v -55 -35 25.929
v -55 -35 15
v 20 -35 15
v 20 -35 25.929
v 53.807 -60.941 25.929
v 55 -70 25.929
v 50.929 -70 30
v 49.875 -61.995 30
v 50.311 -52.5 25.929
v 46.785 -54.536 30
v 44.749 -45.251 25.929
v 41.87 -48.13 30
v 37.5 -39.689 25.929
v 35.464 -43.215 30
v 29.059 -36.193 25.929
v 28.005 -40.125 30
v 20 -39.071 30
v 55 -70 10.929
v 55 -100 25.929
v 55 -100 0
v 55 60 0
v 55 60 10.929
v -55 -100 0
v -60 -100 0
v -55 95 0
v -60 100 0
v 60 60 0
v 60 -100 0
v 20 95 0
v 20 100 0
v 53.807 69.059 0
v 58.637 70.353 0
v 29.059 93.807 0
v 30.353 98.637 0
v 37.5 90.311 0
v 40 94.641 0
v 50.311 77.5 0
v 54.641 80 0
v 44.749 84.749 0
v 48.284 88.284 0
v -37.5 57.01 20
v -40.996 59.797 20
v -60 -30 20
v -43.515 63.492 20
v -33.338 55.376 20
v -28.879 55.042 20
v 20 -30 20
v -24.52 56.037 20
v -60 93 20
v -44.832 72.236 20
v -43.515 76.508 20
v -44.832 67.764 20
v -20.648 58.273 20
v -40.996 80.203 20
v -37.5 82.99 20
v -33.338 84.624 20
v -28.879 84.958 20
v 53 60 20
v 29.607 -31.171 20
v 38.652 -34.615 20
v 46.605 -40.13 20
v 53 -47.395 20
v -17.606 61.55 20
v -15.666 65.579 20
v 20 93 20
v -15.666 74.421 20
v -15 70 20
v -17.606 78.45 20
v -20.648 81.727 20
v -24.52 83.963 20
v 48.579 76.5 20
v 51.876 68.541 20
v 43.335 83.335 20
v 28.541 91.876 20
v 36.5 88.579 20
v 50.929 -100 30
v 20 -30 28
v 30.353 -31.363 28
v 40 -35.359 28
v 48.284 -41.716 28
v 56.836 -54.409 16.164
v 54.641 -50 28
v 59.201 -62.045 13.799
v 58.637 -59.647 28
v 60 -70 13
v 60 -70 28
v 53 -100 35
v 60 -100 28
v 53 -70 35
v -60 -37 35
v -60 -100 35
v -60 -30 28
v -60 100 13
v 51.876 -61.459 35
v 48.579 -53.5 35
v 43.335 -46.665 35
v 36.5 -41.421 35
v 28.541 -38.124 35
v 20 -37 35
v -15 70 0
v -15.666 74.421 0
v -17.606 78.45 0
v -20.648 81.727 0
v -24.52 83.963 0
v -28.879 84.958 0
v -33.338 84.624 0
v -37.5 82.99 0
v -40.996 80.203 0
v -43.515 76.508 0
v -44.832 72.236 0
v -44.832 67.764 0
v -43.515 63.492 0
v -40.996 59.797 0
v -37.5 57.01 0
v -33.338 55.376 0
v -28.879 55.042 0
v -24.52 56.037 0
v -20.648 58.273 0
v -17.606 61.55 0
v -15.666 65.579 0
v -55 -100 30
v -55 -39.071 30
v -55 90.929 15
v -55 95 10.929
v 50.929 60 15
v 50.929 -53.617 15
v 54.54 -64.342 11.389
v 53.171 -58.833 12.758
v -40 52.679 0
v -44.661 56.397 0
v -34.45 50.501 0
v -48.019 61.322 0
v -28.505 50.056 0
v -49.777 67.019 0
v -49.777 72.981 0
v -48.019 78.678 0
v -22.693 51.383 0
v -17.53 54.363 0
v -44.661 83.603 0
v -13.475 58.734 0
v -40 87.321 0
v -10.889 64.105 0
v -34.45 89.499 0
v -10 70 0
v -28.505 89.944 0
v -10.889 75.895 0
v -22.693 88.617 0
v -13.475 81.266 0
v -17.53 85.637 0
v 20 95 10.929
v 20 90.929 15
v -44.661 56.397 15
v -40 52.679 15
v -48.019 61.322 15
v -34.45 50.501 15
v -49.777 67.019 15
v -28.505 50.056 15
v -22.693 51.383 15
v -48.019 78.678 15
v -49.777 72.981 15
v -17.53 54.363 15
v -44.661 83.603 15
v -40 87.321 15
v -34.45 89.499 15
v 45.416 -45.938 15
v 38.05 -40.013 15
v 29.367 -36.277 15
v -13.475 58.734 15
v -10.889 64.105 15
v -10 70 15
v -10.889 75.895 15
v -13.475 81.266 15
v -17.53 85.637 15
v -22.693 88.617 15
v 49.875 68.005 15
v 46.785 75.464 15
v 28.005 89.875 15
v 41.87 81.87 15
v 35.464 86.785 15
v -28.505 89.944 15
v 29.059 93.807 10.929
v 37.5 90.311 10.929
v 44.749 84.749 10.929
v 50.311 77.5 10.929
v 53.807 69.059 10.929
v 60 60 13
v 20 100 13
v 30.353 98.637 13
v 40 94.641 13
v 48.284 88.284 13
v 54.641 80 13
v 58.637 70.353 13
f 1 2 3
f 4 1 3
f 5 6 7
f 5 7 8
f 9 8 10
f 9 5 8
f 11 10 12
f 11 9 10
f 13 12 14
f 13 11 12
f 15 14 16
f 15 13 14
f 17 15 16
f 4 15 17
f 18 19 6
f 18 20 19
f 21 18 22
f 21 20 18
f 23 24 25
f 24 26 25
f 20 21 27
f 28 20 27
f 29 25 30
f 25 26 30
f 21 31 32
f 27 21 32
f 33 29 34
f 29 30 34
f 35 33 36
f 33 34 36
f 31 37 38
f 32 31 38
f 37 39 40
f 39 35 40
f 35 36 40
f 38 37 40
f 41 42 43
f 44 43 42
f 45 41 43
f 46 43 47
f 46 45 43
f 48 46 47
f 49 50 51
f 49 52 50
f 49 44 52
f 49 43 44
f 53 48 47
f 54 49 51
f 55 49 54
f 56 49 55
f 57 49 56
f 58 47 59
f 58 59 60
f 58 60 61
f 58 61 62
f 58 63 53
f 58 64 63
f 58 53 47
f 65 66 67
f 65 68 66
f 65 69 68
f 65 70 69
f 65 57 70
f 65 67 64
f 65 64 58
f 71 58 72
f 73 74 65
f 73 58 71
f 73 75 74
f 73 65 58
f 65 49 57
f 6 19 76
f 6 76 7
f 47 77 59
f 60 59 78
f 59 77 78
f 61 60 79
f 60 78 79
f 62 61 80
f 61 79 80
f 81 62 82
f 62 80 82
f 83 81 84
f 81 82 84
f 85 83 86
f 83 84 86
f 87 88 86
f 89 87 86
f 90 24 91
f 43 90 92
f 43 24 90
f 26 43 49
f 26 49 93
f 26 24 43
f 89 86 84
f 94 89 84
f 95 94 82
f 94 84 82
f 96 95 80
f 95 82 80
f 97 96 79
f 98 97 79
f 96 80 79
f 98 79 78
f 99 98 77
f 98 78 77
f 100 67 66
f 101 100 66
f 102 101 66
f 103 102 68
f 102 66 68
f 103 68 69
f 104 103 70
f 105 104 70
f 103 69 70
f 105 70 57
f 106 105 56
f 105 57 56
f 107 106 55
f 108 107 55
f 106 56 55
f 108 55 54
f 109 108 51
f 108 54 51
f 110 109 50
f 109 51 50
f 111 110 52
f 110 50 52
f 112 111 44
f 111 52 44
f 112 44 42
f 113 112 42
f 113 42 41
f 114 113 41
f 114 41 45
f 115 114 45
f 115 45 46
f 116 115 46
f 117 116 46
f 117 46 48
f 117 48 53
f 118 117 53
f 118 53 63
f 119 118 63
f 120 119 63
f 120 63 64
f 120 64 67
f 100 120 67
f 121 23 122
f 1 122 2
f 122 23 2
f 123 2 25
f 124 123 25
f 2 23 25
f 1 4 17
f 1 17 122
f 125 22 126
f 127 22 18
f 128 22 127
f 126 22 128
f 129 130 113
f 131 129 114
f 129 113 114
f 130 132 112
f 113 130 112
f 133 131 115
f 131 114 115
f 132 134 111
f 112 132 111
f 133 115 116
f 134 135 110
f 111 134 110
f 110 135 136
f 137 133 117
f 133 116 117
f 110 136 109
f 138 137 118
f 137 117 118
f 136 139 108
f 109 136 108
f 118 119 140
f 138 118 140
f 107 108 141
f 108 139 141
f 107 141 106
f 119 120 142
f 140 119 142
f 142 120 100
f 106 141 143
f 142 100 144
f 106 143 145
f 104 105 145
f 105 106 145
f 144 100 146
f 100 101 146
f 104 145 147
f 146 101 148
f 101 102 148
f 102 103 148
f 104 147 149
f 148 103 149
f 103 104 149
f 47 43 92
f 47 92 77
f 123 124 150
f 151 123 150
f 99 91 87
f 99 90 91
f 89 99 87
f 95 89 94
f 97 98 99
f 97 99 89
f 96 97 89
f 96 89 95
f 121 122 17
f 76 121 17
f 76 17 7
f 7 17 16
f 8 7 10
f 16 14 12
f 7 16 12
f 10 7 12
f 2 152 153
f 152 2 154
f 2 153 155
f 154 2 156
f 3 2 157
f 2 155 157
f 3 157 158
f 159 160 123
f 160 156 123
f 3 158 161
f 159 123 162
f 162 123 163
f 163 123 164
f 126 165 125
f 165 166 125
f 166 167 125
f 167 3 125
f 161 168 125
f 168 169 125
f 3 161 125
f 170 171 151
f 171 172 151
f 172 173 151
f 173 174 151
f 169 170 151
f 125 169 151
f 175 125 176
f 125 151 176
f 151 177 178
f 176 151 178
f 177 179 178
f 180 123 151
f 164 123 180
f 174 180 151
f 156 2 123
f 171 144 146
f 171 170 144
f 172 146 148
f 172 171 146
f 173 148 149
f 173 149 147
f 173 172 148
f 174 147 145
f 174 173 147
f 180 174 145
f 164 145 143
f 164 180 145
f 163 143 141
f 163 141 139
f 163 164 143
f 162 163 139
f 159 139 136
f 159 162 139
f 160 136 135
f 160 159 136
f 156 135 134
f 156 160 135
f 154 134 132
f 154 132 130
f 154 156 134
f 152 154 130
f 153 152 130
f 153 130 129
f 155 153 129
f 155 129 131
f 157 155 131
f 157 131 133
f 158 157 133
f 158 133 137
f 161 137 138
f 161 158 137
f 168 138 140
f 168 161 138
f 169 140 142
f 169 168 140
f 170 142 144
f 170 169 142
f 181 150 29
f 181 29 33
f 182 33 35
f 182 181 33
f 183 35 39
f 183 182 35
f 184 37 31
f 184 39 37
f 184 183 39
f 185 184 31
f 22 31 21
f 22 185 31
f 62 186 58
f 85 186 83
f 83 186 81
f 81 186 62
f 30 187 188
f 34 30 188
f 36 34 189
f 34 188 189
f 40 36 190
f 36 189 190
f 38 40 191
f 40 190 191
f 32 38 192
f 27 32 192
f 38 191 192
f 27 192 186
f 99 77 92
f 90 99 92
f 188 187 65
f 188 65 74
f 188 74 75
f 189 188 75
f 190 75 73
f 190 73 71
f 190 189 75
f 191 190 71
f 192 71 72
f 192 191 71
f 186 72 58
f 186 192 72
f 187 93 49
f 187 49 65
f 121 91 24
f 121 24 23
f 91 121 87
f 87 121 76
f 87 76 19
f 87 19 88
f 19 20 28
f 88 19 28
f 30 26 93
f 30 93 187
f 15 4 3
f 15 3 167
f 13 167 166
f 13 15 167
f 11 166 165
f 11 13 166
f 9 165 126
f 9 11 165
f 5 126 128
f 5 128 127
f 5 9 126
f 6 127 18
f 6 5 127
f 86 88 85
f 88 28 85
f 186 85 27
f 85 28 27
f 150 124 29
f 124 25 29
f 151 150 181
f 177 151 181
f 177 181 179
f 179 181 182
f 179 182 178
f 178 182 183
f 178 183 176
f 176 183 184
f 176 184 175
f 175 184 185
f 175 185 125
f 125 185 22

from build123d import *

# Parameters (mm, degrees)
SKETCH1_W           = 120
SKETCH1_H           = 200
BOSS_EXTRUDE1_DEPTH = 20
SKETCH2_W           = 120
SKETCH2_H           = 70
BOSS_EXTRUDE2_DEPTH = 15
SKETCH3_R           = 15
CUT_EXTRUDE1_DEPTH  = 119.321595662
FILLET1_R           = 40
CHAMFER1_SIZE       = 7
SHELL2_T            = -5


with BuildPart() as part:
    # Sketch1 → Boss-Extrude1 (new body)
    with BuildSketch(Plane.XY):
        Rectangle(SKETCH1_W, SKETCH1_H)
    extrude(amount=BOSS_EXTRUDE1_DEPTH)

    # Sketch2 → Boss-Extrude2 (add)
    with BuildSketch(Plane.XY.offset(20)):
        with Locations((0, -65)):
            Rectangle(SKETCH2_W, SKETCH2_H)
    extrude(amount=BOSS_EXTRUDE2_DEPTH)

    # Sketch3 → Cut-Extrude1 (cut, through all)
    with BuildSketch(Plane.XY.offset(20)):
        with Locations((-30, 70)):
            Circle(SKETCH3_R)
    extrude(amount=-CUT_EXTRUDE1_DEPTH, mode=Mode.SUBTRACT)

    # Fillet1
    fillet1_edges = [part.edges().sort_by_distance(p)[0] for p in [
        (60, -30, 27.5),
        (60, 100, 10),
    ]]
    fillet(fillet1_edges, radius=FILLET1_R)

    # Chamfer1
    chamfer1_edges = [part.edges().sort_by_distance(p)[0] for p in [
        (60, -5, 20),
        (60, -85, 35),
        (-20, -30, 35),
        (48.284271247, -41.715728753, 35),
        (-20, 100, 20),
        (48.284271247, 88.284271247, 20),
    ]]
    chamfer(chamfer1_edges, length=CHAMFER1_SIZE)

    # Shell2
    shell2_openings = [part.faces().sort_by_distance(p)[0] for p in [
        (0.159993916, -3.518488273, 0),
        (-0.338362671, -100, 17.411008662),
    ]]
    offset(amount=SHELL2_T, openings=shell2_openings, kind=Kind.INTERSECTION)


solid = part.part
